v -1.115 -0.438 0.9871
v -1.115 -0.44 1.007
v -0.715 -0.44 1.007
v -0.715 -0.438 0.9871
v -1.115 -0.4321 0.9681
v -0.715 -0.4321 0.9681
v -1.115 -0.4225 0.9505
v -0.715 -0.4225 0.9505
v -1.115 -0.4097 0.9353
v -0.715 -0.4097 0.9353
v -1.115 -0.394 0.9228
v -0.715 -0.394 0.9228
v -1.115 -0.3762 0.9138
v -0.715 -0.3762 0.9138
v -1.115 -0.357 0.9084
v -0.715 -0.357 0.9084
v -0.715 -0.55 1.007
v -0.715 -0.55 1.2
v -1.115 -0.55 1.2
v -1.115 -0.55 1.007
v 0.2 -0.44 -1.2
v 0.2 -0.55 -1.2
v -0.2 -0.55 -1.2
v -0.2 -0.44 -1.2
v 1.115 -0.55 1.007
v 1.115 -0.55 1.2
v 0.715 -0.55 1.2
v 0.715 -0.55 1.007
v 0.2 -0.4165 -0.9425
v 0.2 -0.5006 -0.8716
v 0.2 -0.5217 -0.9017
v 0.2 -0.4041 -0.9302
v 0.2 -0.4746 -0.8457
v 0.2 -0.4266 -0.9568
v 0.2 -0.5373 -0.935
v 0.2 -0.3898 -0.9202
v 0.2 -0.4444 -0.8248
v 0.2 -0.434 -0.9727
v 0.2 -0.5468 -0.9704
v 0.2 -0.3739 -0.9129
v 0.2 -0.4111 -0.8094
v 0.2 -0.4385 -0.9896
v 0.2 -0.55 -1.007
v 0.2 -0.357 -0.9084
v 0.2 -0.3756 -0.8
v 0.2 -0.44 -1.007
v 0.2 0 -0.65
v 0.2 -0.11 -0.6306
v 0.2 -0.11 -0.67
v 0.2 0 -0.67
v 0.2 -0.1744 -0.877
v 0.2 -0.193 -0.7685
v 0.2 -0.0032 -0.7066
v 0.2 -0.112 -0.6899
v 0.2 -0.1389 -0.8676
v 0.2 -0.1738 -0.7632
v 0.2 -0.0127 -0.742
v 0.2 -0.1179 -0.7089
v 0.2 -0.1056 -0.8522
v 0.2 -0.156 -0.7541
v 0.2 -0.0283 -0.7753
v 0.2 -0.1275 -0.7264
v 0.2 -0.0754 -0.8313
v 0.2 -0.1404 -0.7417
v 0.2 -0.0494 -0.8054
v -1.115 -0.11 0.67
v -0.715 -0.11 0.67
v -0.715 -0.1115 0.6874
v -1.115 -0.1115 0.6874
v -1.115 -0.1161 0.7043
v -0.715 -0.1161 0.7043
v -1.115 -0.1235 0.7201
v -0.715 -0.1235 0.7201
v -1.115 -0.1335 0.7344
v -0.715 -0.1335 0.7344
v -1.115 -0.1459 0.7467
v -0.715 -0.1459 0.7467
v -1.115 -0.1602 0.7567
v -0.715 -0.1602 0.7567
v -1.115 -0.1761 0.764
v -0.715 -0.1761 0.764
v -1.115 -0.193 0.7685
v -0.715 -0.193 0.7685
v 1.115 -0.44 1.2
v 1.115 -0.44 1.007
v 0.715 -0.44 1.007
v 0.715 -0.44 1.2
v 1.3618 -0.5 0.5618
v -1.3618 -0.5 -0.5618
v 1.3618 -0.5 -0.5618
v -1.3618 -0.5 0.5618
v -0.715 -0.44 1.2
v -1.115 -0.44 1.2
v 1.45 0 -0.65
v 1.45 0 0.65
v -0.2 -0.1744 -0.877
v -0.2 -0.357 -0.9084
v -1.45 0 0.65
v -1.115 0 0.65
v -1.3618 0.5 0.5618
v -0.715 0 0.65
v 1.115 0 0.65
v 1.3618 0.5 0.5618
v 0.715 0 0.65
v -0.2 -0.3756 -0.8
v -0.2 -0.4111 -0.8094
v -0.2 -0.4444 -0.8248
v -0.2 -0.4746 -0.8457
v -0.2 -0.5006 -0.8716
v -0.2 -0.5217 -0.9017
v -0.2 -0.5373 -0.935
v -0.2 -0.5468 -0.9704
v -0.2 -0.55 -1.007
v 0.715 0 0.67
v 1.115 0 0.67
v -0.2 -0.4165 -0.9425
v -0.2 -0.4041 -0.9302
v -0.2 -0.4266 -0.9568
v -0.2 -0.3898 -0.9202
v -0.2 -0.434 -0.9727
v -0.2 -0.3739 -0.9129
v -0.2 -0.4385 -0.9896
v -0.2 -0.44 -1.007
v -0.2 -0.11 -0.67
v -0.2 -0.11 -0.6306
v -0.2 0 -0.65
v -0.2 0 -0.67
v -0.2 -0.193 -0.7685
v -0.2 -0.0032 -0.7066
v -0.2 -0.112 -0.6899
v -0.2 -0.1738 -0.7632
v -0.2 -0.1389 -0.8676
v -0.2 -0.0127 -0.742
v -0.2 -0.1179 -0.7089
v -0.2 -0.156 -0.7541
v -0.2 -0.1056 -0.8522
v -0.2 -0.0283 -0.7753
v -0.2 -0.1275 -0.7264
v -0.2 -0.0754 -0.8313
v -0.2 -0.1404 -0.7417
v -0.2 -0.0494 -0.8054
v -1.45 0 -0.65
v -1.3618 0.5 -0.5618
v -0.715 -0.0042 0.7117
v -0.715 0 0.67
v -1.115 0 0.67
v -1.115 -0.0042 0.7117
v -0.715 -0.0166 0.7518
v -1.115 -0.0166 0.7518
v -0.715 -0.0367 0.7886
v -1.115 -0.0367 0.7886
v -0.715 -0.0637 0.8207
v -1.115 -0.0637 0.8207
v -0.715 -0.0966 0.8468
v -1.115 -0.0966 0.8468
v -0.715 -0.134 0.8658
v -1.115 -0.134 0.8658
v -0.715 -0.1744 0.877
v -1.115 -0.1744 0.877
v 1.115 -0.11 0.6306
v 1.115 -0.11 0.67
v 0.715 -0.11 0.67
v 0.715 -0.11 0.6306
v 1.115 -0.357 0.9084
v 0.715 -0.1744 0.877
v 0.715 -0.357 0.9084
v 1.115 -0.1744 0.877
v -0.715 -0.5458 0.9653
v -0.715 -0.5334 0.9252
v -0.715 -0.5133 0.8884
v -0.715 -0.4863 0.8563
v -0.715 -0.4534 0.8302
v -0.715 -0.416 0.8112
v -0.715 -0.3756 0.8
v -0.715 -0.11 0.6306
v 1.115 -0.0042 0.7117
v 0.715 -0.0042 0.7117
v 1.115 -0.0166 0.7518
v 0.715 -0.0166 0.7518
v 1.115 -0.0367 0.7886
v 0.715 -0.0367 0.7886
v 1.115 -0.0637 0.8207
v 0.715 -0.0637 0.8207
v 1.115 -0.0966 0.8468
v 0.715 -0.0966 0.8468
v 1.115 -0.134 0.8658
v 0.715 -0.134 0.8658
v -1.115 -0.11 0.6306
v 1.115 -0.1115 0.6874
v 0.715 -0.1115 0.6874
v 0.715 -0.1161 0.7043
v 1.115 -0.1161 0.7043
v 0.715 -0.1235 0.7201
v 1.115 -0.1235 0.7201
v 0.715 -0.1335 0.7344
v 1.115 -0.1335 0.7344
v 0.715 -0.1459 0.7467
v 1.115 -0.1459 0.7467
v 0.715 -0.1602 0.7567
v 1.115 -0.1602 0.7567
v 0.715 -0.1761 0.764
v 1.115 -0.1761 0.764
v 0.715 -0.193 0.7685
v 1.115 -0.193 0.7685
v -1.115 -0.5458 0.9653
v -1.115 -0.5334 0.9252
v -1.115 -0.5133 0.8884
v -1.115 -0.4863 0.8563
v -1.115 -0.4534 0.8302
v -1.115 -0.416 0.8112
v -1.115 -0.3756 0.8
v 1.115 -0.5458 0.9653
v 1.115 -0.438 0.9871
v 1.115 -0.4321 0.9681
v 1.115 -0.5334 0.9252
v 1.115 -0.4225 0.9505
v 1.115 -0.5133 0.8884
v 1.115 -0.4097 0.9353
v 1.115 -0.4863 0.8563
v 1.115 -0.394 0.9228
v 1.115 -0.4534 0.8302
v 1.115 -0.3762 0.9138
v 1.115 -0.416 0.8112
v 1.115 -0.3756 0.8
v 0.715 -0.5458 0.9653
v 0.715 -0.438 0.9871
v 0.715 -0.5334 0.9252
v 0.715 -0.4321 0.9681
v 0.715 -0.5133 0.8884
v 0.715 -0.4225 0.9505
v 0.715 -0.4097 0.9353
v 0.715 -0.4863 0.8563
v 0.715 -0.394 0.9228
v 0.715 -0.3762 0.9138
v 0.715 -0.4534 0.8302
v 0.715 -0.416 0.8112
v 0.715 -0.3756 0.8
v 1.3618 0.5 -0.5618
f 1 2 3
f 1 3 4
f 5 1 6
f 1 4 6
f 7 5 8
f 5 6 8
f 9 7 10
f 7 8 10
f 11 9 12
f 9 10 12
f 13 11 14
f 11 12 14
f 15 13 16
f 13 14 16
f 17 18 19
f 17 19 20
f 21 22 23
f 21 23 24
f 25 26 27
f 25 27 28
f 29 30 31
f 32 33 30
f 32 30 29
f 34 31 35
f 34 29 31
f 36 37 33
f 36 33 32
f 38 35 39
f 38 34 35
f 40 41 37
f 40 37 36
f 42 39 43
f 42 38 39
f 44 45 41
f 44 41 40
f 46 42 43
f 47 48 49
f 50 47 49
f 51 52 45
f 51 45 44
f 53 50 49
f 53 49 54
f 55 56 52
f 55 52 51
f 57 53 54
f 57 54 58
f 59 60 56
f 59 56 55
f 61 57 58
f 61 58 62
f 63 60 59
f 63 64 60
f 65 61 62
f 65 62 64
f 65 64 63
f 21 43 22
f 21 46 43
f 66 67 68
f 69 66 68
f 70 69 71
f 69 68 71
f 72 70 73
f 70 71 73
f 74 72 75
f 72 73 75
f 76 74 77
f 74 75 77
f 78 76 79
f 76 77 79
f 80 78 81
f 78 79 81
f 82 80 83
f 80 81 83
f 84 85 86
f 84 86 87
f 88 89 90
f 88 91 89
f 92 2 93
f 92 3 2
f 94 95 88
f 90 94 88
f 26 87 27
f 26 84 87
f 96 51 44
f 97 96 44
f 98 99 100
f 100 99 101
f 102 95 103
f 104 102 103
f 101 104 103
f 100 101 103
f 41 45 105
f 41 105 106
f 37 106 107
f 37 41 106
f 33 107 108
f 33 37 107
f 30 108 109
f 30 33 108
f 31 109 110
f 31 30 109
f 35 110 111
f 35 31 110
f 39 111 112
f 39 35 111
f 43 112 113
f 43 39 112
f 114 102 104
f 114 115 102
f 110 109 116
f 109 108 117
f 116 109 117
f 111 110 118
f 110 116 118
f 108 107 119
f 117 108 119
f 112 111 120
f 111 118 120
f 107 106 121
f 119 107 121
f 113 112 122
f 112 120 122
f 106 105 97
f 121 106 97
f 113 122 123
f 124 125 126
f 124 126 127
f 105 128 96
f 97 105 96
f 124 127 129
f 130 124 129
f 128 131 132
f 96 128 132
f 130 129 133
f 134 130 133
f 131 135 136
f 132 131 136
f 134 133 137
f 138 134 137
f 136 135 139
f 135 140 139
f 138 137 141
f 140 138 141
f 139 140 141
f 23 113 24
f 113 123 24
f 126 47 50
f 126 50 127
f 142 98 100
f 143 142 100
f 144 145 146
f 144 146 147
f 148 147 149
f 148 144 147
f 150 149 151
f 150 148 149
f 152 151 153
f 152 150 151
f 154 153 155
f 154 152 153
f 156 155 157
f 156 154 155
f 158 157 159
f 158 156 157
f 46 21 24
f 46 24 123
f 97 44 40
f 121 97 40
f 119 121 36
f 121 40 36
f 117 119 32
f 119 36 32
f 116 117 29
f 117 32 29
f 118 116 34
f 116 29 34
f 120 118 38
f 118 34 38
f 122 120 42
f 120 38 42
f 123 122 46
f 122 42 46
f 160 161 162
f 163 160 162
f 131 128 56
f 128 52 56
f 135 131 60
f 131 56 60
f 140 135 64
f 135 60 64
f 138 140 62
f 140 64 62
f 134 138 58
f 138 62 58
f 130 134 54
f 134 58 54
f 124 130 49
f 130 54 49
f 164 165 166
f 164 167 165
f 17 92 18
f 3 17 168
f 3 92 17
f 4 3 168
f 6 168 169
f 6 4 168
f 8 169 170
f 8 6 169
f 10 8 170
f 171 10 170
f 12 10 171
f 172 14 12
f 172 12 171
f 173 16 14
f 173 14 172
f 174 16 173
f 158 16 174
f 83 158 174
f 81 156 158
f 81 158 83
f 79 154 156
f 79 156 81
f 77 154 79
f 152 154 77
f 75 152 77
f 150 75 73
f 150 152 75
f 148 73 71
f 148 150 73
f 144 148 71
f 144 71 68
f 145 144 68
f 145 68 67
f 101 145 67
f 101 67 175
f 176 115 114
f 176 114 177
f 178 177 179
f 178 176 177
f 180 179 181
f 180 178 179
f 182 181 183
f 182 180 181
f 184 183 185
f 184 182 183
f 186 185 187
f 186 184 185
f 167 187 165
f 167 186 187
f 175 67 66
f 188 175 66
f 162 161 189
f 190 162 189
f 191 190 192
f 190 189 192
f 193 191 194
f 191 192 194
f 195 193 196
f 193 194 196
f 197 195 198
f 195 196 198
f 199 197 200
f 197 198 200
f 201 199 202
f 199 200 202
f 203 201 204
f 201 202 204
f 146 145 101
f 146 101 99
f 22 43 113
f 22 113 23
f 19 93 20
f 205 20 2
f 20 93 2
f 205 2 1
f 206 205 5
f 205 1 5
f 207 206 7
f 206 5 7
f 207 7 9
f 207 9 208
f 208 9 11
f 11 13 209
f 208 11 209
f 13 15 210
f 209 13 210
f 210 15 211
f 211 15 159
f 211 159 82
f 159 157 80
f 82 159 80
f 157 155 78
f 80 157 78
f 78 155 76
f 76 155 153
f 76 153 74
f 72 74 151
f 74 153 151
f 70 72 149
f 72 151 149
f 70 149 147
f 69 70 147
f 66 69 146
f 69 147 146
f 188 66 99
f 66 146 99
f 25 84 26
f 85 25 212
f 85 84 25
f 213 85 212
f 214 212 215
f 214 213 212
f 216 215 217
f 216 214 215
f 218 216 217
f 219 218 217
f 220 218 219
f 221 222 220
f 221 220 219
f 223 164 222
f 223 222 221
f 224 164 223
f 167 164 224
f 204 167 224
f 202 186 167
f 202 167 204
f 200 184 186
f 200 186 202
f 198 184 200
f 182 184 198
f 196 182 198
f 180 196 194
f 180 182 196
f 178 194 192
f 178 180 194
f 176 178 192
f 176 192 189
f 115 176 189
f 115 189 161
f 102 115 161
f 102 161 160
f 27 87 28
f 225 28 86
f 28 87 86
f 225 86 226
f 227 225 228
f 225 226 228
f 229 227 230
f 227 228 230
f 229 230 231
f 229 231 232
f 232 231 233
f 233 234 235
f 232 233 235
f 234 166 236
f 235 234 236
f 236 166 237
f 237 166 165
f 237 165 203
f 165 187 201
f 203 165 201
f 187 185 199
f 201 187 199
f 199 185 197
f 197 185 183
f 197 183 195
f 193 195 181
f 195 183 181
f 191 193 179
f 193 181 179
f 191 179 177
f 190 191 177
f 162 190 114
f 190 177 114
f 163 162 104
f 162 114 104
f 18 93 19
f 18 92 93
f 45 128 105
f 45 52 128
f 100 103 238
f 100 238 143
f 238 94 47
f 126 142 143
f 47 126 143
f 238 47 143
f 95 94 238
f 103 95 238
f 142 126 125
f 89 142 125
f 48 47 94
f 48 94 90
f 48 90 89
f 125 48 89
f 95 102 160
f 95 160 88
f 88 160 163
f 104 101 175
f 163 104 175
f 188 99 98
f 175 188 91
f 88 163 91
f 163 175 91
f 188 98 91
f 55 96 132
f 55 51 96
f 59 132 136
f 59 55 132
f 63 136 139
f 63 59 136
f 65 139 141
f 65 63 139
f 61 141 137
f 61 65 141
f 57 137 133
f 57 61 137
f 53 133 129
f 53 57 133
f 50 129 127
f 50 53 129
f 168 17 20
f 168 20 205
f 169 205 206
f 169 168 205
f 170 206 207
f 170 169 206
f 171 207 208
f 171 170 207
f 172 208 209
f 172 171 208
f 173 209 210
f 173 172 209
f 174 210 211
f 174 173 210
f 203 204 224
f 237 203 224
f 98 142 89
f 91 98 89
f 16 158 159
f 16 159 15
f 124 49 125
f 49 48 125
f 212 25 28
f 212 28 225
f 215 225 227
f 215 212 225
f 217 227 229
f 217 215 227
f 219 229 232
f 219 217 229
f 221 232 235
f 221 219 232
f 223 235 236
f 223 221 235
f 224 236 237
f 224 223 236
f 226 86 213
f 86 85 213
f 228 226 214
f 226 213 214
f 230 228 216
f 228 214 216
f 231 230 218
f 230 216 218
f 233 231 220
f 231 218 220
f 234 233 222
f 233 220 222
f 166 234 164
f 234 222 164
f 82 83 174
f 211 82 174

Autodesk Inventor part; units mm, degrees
ref_plane "YZ Plane" through (0, 0, 0) normal (1, 0, 0) x (0, 1, 0)
ref_plane "XZ Plane" through (0, 0, 0) normal (0, 1, 0) x (-1, 0, 0)
ref_plane "XY Plane" through (0, 0, 0) normal (0, 0, 1) x (1, 0, 0)
sketch "Sketch1" plane through (0, 0, 0) normal (0, 1, 0) x (-1, 0, 0)
  line L0 (-1.45, 0.65) -> (1.45, 0.65)
  line L1 (1.45, 0.65) -> (1.45, -0.65)
  line L2 (1.45, -0.65) -> (-1.45, -0.65)
  line L3 (-1.45, -0.65) -> (-1.45, 0.65)
  line L4 (-1.45, 0.65) -> (1.45, -0.65) construction
  line L5 (1.45, 0.65) -> (-1.45, -0.65) construction
  point P0 (0, 0)
  dimension "d0" = 2.9
  dimension "d1" = 1.3
extrude "Extrusion1" add sketch "Sketch1" along normal blind 0.5 draft -10
sketch "Sketch2" plane through (0, 0, 0) normal (0, -1, 0) x (1, 0, 0)
  line L0 (1.45, 0.65) -> (-1.45, 0.65) projected
  line L1 (-1.45, 0.65) -> (-1.45, -0.65) projected
  line L2 (-1.45, -0.65) -> (1.45, -0.65) projected
  line L3 (1.45, -0.65) -> (1.45, 0.65) projected
  point P0 (0, 0)
extrude "Extrusion2" add sketch "Sketch2" along normal blind 0.5 draft -10
sketch "Sketch3" plane through (0, 0, 0) normal (0, 1, 0) x (-1, 0, 0)
  line L0 (-1.45, 0.65) -> (1.45, 0.65) projected
  line L1 (1.45, 0.65) -> (1.45, -0.65) projected
  line L2 (1.45, -0.65) -> (-1.45, -0.65) projected
  line L3 (-1.45, -0.65) -> (-1.45, 0.65) projected
  line L4 (-1.115, 0.65) -> (-0.715, 0.65)
  line L5 (-0.715, 0.65) -> (-0.715, 0.67)
  line L6 (-0.715, 0.67) -> (-1.115, 0.67)
  line L7 (-1.115, 0.67) -> (-1.115, 0.65)
  line L8 (-0.2, -0.65) -> (0.2, -0.65)
  line L9 (0.2, -0.65) -> (0.2, -0.67)
  line L10 (0.2, -0.67) -> (-0.2, -0.67)
  line L11 (-0.2, -0.67) -> (-0.2, -0.65)
  line L12 (-0.715, 0.65) -> (-1.115, 0.65)
  line L13 (-1.115, 0.65) -> (-1.115, 0)
  line L14 (-1.115, 0) -> (-0.715, 0)
  line L15 (-0.715, 0) -> (-0.715, 0.65)
  line L16 (-0.2, -0.65) -> (0.2, -0.65)
  line L17 (0.2, -0.65) -> (0.2, 0)
  line L18 (0.2, 0) -> (-0.2, 0)
  line L19 (-0.2, 0) -> (-0.2, -0.65)
  point P0 (0, 0)
  point P1 (0, -0.67)
  point P2 (-0.915, 0.67)
  point P3 (0, 0)
  dimension "d6" = 0.4
  dimension "d7" = 0.02
  dimension "d8" = 0.915
  dimension "d9" = 0
extrude "Extrusion3" add sketch "Sketch3" against normal blind 0.11 contours L7 L6 L5 L0 | L0 L15 L14 L13
sketch "Sketch4" plane through (1.115, 0, 0.67) normal (1, 0, 0) x (0, 0, -1)
  line L0 (0.02, 0) -> (0.0394, -0.11) projected
  line L1 (0, 0) -> (0.02, 0) projected
  line L2 (0, 0) -> (0, -0.11) projected
  line L3 (0.0394, -0.11) -> (0, -0.11) projected
  line L4 (0, -0.11) -> (0.0394, -0.11) projected
  arc A0 (0, -0.11) -> (-0.0985, -0.193) centre (0, -0.21) ccw
  arc A1 (0, 0) -> (-0.207, -0.1744) centre (0, -0.21) ccw
  arc A2 (-0.337, -0.44) -> (-0.2384, -0.357) centre (-0.337, -0.34) ccw
  arc A3 (-0.337, -0.55) -> (-0.13, -0.3756) centre (-0.337, -0.34) ccw
  line L5 (-0.0985, -0.193) -> (-0.13, -0.3756)
  line L6 (-0.207, -0.1744) -> (-0.2384, -0.357)
  line L7 (-0.337, -0.44) -> (-0.53, -0.44)
  line L8 (-0.53, -0.44) -> (-0.53, -0.55)
  line L9 (-0.53, -0.55) -> (-0.337, -0.55)
  line L10 (0.0394, -0.11) -> (0, -0.11) projected
  line L11 (0, 0) -> (0.02, 0) projected
  line L12 (0, 0) -> (0, -0.11) projected
  line L13 (1.2318, -0.5) -> (0.1082, -0.5) projected
  point P0 (0.67, 0)
  dimension "d12" = 1.2
  dimension "d13" = 0.05
  dimension "d14" = 0.1
  dimension "d15" = 0.4
extrude "Extrusion4" add sketch "Sketch4" against normal up to surface (0.4 mm away) contours L2 A0 L5 A3 L9 L8 L7 A2 L6 A1
extrude "Extrusion5" add sketch "Sketch3" against normal blind 0.11 contours L19 L18 L17 L2 | L2 L9 L10 L11
sketch "Sketch5" plane through (0.2, 0, -0.65) normal (1, 0, 0) x (0, 0, -1)
  line L0 (-1.3, 0) -> (-1.2806, -0.11) projected
  line L1 (-1.32, 0) -> (-1.3, 0) projected
  arc A0 (-1.32, 0) -> (-1.527, -0.1744) centre (-1.32, -0.21) ccw projected
  line L2 (-1.527, -0.1744) -> (-1.5584, -0.357) projected
  arc A1 (-1.657, -0.44) -> (-1.5584, -0.357) centre (-1.657, -0.34) ccw projected
  line L3 (-1.657, -0.44) -> (-1.85, -0.44) projected
  line L4 (-1.85, -0.44) -> (-1.85, -0.55) projected
  line L5 (-1.85, -0.55) -> (-1.657, -0.55) projected
  arc A2 (-1.657, -0.55) -> (-1.45, -0.3756) centre (-1.657, -0.34) ccw projected
  line L6 (-1.45, -0.3756) -> (-1.4185, -0.193) projected
  arc A3 (-1.32, -0.11) -> (-1.4185, -0.193) centre (-1.32, -0.21) ccw projected
  line L7 (-1.2806, -0.11) -> (-1.32, -0.11) projected
  line L8 (-0.0194, -0.11) -> (0, 0) projected
  line L9 (0.02, -0.11) -> (-0.0194, -0.11) projected
  line L10 (0.02, 0) -> (0.02, -0.11) projected
  line L11 (0, 0) -> (0.02, 0) projected
  arc A4 (0.1185, -0.193) -> (0.02, -0.11) centre (0.02, -0.21) ccw
  line L12 (0.02, 0) -> (0, 0) projected
  arc A5 (0.227, -0.1744) -> (0.02, 0) centre (0.02, -0.21) ccw
  arc A6 (0.2584, -0.357) -> (0.357, -0.44) centre (0.357, -0.34) ccw
  arc A7 (0.15, -0.3756) -> (0.357, -0.55) centre (0.357, -0.34) ccw
  line L13 (0.357, -0.55) -> (0.55, -0.55)
  line L14 (0.55, -0.55) -> (0.55, -0.44)
  line L15 (0.55, -0.44) -> (0.357, -0.44)
  line L16 (0.227, -0.1744) -> (0.2584, -0.357)
  line L17 (0.1185, -0.193) -> (0.15, -0.3756)
  point P0 (-0.65, 0)
extrude "Extrusion6" add sketch "Sketch5" against normal up to surface (0.4 mm away) contours L10 A5 L16 A6 L15 L14 L13 A7 L17 A4
pattern_linear "Rectangular Pattern1" count 2 spacing 1.83 along (-1, 0, 0) of "Extrusion3", "Extrusion4"
properties part number "Semiconductor_SOT23-3" material "ABS Plastic"
